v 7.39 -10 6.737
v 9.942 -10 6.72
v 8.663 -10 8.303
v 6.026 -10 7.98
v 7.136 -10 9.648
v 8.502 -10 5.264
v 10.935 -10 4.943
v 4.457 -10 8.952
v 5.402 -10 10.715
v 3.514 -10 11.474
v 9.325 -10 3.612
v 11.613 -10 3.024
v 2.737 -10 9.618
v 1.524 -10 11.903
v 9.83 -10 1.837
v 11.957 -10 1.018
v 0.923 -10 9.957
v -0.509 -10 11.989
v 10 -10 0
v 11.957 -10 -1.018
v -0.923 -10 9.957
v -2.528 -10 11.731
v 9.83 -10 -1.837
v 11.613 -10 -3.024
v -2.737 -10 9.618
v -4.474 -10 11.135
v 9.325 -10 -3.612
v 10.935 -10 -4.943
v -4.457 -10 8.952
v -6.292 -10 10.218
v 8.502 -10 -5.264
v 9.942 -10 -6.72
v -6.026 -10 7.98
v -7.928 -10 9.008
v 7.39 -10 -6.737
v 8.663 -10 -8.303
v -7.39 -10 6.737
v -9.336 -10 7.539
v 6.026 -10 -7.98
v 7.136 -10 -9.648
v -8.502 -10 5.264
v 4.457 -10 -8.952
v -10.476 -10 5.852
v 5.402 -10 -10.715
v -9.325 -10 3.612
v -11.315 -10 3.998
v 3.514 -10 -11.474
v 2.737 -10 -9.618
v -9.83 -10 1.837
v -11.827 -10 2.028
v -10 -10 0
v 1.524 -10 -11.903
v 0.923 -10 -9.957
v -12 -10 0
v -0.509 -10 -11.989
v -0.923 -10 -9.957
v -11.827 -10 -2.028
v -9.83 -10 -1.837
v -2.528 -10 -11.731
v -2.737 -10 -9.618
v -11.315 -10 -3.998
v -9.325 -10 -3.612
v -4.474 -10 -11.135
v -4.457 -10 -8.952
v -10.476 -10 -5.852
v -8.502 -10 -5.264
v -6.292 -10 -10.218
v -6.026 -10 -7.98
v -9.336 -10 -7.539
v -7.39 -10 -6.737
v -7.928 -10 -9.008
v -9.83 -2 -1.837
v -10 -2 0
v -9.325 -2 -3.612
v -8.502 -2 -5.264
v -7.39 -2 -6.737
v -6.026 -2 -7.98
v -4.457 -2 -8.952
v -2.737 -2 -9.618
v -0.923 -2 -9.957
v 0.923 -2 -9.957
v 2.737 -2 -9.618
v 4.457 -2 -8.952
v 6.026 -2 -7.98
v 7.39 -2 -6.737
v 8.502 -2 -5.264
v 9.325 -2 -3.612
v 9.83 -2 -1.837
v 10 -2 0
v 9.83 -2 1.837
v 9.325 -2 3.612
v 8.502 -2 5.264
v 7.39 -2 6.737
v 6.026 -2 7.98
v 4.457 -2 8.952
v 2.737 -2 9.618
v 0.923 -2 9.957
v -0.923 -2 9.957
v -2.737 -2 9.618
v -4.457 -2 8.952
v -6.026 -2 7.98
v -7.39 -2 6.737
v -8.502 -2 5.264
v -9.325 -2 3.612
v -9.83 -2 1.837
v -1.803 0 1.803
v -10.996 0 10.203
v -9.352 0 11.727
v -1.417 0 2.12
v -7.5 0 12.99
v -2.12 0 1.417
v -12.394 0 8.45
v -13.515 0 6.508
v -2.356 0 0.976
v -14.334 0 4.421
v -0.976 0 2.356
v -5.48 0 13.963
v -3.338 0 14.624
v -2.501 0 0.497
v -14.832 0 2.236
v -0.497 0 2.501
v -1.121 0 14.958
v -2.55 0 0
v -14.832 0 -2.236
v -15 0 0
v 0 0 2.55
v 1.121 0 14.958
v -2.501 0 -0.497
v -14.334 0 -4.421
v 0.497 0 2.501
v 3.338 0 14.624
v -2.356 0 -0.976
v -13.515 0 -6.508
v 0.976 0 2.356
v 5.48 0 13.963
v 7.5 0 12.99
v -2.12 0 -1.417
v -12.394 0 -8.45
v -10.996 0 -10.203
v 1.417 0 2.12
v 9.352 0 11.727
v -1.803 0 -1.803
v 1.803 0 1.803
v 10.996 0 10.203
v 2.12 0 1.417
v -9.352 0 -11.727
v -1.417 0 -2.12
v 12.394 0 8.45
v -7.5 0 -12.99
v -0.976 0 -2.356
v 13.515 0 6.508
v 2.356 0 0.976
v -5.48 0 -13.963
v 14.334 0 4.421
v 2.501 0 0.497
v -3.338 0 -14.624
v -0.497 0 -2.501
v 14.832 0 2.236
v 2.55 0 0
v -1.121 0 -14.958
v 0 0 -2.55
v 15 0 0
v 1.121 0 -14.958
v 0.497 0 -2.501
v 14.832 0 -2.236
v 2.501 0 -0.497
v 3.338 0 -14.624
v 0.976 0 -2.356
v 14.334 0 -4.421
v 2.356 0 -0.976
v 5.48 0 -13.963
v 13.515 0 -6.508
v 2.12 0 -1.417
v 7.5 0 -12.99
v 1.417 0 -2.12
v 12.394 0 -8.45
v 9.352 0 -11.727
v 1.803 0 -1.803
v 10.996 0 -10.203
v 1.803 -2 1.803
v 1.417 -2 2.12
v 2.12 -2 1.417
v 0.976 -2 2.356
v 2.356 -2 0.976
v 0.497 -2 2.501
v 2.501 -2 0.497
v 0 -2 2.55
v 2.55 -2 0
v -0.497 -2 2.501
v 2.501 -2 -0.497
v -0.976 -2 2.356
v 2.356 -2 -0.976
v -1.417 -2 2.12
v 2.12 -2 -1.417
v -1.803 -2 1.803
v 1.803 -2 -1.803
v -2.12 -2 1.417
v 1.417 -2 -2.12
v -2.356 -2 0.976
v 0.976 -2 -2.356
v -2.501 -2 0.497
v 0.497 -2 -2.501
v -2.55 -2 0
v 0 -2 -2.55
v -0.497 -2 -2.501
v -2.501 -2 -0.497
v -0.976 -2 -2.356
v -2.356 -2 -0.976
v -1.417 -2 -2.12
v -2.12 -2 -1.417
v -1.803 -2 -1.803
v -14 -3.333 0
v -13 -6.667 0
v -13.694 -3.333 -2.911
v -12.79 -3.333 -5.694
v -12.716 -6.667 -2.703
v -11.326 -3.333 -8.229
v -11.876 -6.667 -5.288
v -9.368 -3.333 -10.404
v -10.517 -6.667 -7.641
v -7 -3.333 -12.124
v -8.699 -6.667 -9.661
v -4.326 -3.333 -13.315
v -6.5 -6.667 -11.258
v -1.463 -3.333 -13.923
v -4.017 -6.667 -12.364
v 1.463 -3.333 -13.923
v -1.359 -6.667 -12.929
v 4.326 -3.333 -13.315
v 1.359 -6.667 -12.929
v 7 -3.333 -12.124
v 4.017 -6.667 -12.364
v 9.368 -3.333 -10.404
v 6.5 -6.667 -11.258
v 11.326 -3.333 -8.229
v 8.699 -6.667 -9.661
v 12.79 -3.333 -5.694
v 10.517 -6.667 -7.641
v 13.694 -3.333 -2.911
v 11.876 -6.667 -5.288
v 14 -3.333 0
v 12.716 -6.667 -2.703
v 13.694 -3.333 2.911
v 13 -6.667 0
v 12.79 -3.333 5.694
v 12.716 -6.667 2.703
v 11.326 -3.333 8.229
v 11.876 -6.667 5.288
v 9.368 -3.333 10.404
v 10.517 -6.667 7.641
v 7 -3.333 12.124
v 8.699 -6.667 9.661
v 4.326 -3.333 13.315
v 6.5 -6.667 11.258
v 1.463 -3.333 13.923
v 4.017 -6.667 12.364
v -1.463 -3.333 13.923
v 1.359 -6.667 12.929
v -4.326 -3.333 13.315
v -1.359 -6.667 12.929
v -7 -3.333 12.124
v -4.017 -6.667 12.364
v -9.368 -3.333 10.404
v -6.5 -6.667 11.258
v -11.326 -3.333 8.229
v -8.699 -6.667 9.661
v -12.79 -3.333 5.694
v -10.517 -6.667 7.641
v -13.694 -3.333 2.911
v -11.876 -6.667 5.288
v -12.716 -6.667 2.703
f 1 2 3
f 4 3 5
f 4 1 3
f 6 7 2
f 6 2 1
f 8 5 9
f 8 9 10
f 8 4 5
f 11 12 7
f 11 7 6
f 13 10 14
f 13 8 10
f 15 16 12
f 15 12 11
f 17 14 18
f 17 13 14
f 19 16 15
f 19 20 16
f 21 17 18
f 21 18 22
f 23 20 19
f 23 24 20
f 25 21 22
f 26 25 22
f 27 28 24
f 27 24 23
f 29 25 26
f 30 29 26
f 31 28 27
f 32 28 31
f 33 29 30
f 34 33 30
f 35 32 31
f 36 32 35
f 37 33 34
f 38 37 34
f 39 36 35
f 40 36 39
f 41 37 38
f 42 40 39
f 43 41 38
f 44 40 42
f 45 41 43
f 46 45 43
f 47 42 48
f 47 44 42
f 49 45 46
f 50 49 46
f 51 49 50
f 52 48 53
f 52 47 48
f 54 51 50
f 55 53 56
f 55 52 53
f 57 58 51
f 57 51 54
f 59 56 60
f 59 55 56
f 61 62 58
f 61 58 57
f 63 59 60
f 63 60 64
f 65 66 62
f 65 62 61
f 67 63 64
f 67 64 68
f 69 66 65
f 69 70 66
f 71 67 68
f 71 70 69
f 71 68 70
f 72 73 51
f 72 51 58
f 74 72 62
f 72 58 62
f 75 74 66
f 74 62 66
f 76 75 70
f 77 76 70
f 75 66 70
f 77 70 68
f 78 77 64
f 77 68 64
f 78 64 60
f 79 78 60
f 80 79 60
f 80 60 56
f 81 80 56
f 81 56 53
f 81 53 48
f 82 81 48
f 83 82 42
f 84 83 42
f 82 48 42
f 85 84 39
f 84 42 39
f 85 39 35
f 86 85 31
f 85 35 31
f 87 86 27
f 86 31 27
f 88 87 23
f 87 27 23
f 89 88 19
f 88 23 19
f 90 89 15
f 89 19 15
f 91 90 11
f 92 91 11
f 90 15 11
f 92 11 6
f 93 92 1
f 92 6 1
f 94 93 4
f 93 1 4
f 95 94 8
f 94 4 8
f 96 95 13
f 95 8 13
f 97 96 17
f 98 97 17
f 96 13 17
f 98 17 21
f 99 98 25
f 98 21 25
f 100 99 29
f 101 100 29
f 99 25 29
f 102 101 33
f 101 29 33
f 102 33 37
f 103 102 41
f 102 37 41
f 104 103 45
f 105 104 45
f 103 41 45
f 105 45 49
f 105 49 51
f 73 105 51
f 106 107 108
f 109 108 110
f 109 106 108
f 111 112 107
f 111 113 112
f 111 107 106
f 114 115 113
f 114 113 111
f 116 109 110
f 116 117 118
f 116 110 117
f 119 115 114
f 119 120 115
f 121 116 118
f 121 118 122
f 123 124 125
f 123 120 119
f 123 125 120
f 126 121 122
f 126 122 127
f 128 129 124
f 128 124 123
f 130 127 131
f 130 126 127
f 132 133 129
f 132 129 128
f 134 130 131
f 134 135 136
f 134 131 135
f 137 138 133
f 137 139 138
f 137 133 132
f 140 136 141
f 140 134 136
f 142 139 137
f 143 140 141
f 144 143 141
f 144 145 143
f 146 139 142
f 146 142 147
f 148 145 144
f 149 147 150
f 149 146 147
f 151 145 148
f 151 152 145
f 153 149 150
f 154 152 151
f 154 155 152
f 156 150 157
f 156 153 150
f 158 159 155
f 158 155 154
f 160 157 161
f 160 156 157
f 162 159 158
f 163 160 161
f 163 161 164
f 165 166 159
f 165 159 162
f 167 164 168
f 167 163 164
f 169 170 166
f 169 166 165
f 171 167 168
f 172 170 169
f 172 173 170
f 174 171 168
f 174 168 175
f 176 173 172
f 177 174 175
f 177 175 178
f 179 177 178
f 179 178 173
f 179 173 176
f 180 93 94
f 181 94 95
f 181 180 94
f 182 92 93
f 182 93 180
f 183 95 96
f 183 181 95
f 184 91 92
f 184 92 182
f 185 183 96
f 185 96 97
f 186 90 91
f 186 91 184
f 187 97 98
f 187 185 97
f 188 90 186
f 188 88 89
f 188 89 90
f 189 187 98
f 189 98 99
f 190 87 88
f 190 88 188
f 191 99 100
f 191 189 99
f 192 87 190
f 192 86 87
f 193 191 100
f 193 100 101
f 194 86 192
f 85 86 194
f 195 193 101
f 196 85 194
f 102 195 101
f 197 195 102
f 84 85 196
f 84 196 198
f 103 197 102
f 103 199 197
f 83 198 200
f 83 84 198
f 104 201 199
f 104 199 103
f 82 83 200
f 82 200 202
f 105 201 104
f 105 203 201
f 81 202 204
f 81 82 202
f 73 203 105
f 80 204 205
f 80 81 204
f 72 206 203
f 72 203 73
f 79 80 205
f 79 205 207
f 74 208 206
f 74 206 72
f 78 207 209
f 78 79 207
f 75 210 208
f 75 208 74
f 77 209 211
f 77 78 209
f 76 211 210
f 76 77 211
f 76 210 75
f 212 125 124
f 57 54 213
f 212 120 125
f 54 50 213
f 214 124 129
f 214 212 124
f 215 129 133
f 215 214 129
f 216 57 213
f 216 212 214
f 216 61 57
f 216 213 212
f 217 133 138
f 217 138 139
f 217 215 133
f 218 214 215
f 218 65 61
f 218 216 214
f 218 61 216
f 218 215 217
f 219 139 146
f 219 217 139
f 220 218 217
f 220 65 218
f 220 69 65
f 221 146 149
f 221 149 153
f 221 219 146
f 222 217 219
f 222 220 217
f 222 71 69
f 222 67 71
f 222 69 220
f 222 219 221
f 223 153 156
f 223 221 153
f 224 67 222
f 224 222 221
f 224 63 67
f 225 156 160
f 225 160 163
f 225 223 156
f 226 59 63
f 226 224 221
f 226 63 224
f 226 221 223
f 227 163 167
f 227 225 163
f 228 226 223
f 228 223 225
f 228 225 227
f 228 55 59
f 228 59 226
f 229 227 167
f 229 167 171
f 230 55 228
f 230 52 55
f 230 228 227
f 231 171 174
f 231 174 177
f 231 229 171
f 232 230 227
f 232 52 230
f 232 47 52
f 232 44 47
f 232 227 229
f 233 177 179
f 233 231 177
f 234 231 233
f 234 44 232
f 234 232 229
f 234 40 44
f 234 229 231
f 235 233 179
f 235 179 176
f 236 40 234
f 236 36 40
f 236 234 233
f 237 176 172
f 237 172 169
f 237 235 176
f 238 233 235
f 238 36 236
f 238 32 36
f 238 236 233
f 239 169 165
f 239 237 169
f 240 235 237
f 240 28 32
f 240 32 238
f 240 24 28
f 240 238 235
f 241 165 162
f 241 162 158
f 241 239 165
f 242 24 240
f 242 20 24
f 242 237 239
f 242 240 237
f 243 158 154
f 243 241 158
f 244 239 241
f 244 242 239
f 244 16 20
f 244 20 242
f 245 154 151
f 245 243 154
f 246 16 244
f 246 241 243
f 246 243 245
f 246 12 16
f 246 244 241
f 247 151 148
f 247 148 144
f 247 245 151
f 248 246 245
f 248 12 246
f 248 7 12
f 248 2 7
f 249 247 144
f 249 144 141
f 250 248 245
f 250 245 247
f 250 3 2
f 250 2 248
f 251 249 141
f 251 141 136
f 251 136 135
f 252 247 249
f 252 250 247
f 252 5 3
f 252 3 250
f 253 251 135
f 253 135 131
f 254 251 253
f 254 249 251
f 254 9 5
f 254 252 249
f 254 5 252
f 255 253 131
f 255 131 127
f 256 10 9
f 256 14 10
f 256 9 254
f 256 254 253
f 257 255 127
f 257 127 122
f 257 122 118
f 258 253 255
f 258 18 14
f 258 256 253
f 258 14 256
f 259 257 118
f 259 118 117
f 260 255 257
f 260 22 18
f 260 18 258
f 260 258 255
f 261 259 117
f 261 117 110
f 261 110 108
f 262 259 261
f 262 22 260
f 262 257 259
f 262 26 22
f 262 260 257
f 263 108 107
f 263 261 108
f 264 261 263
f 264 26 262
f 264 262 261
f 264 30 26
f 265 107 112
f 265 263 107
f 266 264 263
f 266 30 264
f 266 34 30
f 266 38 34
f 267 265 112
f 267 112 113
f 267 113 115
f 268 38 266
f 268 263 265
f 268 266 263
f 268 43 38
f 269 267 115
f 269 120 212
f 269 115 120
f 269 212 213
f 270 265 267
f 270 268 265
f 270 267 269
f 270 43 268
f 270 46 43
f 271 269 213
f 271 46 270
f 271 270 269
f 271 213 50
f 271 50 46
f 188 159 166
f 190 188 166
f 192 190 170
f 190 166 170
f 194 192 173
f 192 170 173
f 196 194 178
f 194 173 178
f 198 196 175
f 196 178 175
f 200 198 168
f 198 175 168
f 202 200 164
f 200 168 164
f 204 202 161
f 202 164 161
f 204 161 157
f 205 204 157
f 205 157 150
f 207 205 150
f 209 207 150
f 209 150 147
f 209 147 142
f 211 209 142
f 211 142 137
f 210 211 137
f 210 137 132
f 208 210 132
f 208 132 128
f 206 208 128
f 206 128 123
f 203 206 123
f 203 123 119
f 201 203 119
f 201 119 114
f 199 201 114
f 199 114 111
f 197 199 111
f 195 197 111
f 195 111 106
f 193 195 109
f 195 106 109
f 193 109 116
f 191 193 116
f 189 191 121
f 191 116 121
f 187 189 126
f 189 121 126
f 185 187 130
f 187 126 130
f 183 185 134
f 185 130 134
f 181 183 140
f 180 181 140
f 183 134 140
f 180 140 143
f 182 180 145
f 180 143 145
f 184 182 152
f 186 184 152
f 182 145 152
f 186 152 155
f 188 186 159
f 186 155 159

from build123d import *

# Parameters (mm, degrees)
CROQUIS2_R            = 2.55
CORTAR_EXTRUIR1_DEPTH = 10
CROQUIS3_R            = 10
CORTAR_EXTRUIR2_DEPTH = 8


with BuildPart() as part:
    # Croquis1 → Revolución1 (revolve)
    with BuildSketch(Plane.XY):
        Polygon((-12.044691582, 0), (-15, 0), (-12, -10), (0, -10), (0, 0), align=None)
    revolve(axis=Axis((0, 0, 0), (0, -1, 0)))

    # Croquis2 → Cortar-Extruir1 (cut)
    with BuildSketch(Plane(origin=(0, 0, 0), x_dir=(1, 0, 0), z_dir=(0, 1, 0))):
        Circle(CROQUIS2_R)
    extrude(amount=-CORTAR_EXTRUIR1_DEPTH, mode=Mode.SUBTRACT)

    # Croquis3 → Cortar-Extruir2 (cut)
    with BuildSketch(Plane(origin=(0, -10, 0), x_dir=(-1, 0, 0), z_dir=(0, -1, 0))):
        Circle(CROQUIS3_R)
    extrude(amount=-CORTAR_EXTRUIR2_DEPTH, mode=Mode.SUBTRACT)


solid = part.part
